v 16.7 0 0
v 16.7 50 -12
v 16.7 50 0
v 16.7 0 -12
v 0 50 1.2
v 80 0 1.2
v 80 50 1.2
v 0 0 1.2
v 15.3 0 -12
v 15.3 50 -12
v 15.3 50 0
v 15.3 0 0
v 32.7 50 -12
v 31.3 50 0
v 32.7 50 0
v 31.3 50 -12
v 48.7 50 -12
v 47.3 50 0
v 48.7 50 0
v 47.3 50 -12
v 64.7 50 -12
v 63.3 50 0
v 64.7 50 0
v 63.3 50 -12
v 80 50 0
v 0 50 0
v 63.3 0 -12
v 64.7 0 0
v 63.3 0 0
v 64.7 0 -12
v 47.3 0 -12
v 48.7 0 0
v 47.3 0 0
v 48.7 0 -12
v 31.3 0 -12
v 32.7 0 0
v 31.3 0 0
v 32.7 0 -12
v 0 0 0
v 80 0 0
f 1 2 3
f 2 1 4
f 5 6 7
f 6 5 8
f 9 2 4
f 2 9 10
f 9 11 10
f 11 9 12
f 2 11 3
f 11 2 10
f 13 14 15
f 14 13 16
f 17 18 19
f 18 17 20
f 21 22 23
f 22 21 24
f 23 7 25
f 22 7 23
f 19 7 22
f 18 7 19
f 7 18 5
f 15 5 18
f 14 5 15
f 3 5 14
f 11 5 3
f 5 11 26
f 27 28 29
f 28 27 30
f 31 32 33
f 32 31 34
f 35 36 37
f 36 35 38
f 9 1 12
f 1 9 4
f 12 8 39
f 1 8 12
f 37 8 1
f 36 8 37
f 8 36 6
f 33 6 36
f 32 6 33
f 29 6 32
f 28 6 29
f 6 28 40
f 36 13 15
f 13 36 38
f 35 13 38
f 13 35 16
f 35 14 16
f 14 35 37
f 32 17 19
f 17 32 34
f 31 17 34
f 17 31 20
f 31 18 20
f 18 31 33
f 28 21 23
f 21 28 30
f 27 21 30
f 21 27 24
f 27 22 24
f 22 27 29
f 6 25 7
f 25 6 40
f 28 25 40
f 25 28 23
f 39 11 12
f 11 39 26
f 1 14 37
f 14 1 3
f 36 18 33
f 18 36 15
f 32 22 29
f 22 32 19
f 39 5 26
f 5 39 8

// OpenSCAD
$fn = 32;

// ----------------------------------------------------------------------
// Ribbed panel: 1.2 mm panel
// ----------------------------------------------------------------------

// --- parameters (mm) ---
panel_l = 80;             // panel length, X
panel_w = 50;             // panel width, Y
panel_t = 1.2;            // panel thickness, Z
rib_t = 1.4;              // rib thickness
rib_h = 12;               // rib height below the panel
ribs = 4;                 // number of ribs

total_h = panel_t + rib_h;  // overall height

union() {
  cube([panel_l, panel_w, panel_t]);
  for (i = [1 : ribs])
    translate([i * panel_l / (ribs + 1) - rib_t / 2, 0, -rib_h])
      cube([rib_t, panel_w, rib_h + panel_t]);
}
